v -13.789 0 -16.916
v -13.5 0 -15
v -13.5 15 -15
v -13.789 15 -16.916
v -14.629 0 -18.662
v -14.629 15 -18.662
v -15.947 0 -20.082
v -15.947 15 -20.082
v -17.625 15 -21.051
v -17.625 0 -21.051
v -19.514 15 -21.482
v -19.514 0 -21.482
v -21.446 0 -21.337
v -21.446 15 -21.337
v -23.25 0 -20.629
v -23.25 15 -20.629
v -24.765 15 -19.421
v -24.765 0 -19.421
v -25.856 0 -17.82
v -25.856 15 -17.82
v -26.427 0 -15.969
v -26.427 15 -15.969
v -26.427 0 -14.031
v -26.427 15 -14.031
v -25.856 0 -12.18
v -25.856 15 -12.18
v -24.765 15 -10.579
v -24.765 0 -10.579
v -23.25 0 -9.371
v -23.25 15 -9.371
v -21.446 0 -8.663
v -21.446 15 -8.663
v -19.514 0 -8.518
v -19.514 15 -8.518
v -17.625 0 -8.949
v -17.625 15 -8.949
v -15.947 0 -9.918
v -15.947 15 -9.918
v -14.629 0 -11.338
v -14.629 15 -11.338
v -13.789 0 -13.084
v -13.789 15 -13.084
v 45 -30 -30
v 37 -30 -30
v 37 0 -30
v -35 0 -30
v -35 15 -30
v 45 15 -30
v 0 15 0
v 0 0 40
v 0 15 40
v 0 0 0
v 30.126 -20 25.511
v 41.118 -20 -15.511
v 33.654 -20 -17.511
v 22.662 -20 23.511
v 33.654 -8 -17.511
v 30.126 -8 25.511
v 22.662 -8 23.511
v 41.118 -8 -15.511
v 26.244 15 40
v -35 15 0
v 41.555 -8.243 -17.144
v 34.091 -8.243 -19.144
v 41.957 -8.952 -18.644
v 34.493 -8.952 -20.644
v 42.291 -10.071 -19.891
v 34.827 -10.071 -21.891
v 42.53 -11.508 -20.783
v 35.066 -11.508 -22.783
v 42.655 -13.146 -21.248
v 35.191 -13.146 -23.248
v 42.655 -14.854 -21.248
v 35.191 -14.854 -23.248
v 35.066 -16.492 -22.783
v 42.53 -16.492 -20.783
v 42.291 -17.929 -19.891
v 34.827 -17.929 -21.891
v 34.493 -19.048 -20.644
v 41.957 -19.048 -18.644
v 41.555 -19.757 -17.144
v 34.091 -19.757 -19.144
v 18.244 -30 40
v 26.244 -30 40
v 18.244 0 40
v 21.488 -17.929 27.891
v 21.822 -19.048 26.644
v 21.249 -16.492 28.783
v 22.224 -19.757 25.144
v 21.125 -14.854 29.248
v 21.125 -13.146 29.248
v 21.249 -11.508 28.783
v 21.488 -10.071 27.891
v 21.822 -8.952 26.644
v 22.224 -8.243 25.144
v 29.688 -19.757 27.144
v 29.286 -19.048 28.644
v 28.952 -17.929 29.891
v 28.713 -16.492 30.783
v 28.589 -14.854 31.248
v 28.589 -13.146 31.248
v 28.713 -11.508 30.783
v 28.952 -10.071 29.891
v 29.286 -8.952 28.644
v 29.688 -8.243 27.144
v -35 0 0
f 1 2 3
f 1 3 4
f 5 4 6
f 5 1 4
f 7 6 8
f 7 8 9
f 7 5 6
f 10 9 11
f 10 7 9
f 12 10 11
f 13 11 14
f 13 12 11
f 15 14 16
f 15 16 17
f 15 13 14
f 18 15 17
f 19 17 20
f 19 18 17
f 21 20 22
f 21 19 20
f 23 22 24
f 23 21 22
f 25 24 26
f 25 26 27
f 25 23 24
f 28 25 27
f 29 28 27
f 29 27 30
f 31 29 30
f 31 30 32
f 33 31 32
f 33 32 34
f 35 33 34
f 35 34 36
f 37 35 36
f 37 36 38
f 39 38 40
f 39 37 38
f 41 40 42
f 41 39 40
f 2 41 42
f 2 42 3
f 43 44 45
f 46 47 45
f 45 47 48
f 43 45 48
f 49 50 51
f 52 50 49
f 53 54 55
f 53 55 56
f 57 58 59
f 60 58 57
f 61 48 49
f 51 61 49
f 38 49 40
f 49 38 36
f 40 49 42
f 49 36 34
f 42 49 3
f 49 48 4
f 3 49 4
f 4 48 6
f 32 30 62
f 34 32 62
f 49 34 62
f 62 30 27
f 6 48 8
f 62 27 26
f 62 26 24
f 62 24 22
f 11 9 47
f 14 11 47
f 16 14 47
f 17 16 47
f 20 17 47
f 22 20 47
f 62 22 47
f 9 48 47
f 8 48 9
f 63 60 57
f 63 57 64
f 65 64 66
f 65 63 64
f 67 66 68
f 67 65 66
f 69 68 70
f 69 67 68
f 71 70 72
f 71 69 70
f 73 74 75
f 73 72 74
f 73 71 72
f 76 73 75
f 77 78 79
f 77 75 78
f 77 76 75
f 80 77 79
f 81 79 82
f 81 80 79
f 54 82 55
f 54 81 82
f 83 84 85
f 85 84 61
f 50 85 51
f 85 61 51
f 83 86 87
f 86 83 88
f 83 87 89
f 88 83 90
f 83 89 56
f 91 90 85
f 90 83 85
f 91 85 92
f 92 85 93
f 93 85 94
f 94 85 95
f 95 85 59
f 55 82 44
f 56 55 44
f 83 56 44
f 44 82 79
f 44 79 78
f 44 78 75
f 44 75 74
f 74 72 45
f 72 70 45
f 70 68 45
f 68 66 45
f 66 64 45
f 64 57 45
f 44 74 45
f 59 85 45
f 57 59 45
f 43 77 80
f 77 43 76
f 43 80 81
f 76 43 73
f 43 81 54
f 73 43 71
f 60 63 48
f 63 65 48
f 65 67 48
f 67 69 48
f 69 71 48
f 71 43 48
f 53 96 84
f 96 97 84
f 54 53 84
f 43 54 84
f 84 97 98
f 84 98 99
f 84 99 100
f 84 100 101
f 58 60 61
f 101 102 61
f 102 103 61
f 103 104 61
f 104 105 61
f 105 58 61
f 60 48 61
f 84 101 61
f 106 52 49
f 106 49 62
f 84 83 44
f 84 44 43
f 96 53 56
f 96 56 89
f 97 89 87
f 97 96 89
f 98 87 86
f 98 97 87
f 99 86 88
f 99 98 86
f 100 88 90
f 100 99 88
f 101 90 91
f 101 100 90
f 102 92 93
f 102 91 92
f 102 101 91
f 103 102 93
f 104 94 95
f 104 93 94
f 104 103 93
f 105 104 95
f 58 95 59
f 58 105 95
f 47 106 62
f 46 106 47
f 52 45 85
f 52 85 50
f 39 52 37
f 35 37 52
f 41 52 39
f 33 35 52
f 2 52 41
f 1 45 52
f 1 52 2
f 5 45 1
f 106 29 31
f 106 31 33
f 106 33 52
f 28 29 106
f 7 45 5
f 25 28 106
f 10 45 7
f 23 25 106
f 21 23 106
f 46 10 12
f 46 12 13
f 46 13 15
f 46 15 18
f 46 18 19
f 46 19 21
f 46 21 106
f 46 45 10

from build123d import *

# Parameters (mm, degrees)
SKETCH1_R           = 6.5
BOSS_EXTRUDE1_DEPTH = 15
BOSS_EXTRUDE3_DEPTH = 30
CUT_EXTRUDE1_DEPTH  = 10


with BuildPart() as part:
    # Sketch1 → Boss-Extrude1 (new body)
    with BuildSketch(Plane(origin=(0, 0, 0), x_dir=(1, 0, 0), z_dir=(0, 1, 0))):
        Polygon((45, 30), (26.24355653, -40), (0, -40), (0, 0), (-35, 0), (-35, 30), align=None)
        with Locations((-20, 15)):
            Circle(SKETCH1_R, mode=Mode.SUBTRACT)
    extrude(amount=BOSS_EXTRUDE1_DEPTH)

    # Sketch5 → Boss-Extrude3 (add)
    with BuildSketch(Plane.XZ):
        Polygon((18.24355653, 40), (37, -30), (45, -30), (26.24355653, 40), align=None)
    extrude(amount=BOSS_EXTRUDE3_DEPTH)

    # Sketch7 → Cut-Extrude1 (cut)
    with BuildSketch(Plane(origin=(34.485571585, 0, 9.240381057), x_dir=(0.258819045, 0, -0.965925826), z_dir=(0.965925826, 0, 0.258819045))):
        with BuildLine():
            Line((-16.84470081, -8), (25.624631818, -8))
            ThreePointArc((25.624631818, -8), (31.624631818, -14), (25.624631818, -20))
            Line((25.624631818, -20), (-16.84470081, -20))
            ThreePointArc((-16.84470081, -20), (-22.84470081, -14), (-16.84470081, -8))
        make_face()
    extrude(amount=-CUT_EXTRUDE1_DEPTH, mode=Mode.SUBTRACT)


solid = part.part
